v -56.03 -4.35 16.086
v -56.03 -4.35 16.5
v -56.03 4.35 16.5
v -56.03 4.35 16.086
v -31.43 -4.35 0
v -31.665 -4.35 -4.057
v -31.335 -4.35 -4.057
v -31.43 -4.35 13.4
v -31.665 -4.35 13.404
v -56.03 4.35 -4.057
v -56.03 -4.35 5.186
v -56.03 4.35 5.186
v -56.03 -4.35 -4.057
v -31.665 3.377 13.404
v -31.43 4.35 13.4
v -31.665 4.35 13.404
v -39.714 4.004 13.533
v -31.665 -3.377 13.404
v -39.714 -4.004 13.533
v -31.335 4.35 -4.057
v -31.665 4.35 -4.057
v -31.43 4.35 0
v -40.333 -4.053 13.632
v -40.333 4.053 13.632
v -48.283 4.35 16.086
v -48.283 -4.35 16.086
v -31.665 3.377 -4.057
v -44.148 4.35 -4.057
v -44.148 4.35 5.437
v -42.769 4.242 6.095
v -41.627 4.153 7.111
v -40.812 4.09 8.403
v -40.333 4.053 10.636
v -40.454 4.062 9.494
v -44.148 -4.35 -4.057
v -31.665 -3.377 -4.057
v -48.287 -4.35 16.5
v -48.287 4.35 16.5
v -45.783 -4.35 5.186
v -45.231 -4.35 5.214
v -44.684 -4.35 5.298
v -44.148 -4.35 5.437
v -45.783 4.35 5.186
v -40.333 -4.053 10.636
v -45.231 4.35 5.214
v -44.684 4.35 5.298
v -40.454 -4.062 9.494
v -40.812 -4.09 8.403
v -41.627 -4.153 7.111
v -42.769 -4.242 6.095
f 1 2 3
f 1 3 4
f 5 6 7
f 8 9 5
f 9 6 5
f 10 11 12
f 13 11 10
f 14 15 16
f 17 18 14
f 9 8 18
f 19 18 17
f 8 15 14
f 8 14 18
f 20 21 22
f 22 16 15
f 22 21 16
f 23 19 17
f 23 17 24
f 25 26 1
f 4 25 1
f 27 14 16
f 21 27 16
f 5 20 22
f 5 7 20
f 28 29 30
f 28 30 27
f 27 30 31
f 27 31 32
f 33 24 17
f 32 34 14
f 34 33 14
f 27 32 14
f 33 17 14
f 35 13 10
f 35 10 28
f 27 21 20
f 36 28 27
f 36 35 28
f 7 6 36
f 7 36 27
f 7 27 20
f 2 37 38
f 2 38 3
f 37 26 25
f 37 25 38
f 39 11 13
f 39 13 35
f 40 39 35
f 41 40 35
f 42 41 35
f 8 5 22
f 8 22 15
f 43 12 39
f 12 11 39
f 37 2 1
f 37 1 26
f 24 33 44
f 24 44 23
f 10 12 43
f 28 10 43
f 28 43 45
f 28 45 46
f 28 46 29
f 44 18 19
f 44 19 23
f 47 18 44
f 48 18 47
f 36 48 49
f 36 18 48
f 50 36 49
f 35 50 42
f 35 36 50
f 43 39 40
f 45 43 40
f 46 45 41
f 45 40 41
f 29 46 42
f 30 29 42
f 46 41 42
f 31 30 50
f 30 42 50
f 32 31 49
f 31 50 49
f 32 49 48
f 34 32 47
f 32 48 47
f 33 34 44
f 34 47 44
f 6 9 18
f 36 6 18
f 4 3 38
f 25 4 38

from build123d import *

# Parameters (mm, degrees)
F2_DEPTH = 4.35
F4_DEPTH = 13.75
F5_DEPTH = 10.5


with BuildPart() as f2:
    # F0 (on Front) → F2 (new body, symmetric)
    with BuildSketch(Plane.XZ):
        Polygon((-31.3346489608, -4.0566790849), (-31.4301803052, 0), (-31.4301803052, 13.4), (-39.7141215026, 13.5333097816), (-48.2708952457, 14.8973720267), (-48.2867128074, 16.5), (-56.0301803052, 16.5), (-56.0301803052, 0), (-56.0301803052, -4.0566790849), align=None)
    extrude(amount=F2_DEPTH, both=True)


with BuildPart() as f2b:
    # F1 (on Front) → F2, piece 2 (new body, symmetric)
    with BuildSketch(Plane.XZ):
        with BuildLine():
            Line((-45.7834748578, 16.0856869832), (-56.2834748578, 16.0856869832))
            Line((-56.2834748578, 16.0856869832), (-56.2834748578, 5.1856869832))
            Line((-56.2834748578, 5.1856869832), (-45.7834748578, 5.1856869832))
            ThreePointArc((-45.7834748578, 5.1856869832), (-41.9297429004, 6.7819550257), (-40.3334748578, 10.6356869832))
            ThreePointArc((-40.3334748578, 10.6356869832), (-41.9297429004, 14.4894189406), (-45.7834748578, 16.0856869832))
        make_face()
        with BuildLine():
            Line((-40.3334748578, 16.0856869832), (-45.7834748578, 16.0856869832))
            ThreePointArc((-45.7834748578, 16.0856869832), (-41.9297429004, 14.4894189406), (-40.3334748578, 10.6356869832))
            Line((-40.3334748578, 10.6356869832), (-40.3334748578, 16.0856869832))
        make_face()
    extrude(amount=F2_DEPTH, both=True)


with BuildPart() as f4_tool:
    # F3 (on Top) → F4 (new body, symmetric)
    with BuildSketch(Plane.XY):
        Polygon((-31.664647162, -3.3765389722), (-45.2137924731, -4.4331237346), (-31.664647162, -4.4641996406), align=None)
        Polygon((-31.664647162, 4.4641996406), (-45.2137924731, 4.4331237346), (-31.664647162, 3.3765389722), align=None)
    extrude(amount=F4_DEPTH, both=True)


with BuildPart() as f2_1:
    add(f2.part)

    # F4: cut by f4_tool
    add(f4_tool.part, mode=Mode.SUBTRACT)


with BuildPart() as f2b_1:
    add(f2b.part)

    # F4: cut by f4_tool
    add(f4_tool.part, mode=Mode.SUBTRACT)


with BuildPart() as f5_tool:
    # F1 (on Front) → F5 (new body, symmetric)
    with BuildSketch(Plane.XZ):
        with BuildLine():
            Line((-45.7834748578, 16.0856869832), (-56.2834748578, 16.0856869832))
            Line((-56.2834748578, 16.0856869832), (-56.2834748578, 5.1856869832))
            Line((-56.2834748578, 5.1856869832), (-45.7834748578, 5.1856869832))
            ThreePointArc((-45.7834748578, 5.1856869832), (-41.9297429004, 6.7819550257), (-40.3334748578, 10.6356869832))
            ThreePointArc((-40.3334748578, 10.6356869832), (-41.9297429004, 14.4894189406), (-45.7834748578, 16.0856869832))
        make_face()
        with BuildLine():
            Line((-40.3334748578, 16.0856869832), (-45.7834748578, 16.0856869832))
            ThreePointArc((-45.7834748578, 16.0856869832), (-41.9297429004, 14.4894189406), (-40.3334748578, 10.6356869832))
            Line((-40.3334748578, 10.6356869832), (-40.3334748578, 16.0856869832))
        make_face()
    extrude(amount=F5_DEPTH, both=True)


with BuildPart() as f2_2:
    add(f2_1.part)

    # F5: cut by f5_tool
    add(f5_tool.part, mode=Mode.SUBTRACT)


with BuildPart() as f2b_2:
    add(f2b_1.part)

    # F5: cut by f5_tool
    add(f5_tool.part, mode=Mode.SUBTRACT)


solid = f2_2.part
